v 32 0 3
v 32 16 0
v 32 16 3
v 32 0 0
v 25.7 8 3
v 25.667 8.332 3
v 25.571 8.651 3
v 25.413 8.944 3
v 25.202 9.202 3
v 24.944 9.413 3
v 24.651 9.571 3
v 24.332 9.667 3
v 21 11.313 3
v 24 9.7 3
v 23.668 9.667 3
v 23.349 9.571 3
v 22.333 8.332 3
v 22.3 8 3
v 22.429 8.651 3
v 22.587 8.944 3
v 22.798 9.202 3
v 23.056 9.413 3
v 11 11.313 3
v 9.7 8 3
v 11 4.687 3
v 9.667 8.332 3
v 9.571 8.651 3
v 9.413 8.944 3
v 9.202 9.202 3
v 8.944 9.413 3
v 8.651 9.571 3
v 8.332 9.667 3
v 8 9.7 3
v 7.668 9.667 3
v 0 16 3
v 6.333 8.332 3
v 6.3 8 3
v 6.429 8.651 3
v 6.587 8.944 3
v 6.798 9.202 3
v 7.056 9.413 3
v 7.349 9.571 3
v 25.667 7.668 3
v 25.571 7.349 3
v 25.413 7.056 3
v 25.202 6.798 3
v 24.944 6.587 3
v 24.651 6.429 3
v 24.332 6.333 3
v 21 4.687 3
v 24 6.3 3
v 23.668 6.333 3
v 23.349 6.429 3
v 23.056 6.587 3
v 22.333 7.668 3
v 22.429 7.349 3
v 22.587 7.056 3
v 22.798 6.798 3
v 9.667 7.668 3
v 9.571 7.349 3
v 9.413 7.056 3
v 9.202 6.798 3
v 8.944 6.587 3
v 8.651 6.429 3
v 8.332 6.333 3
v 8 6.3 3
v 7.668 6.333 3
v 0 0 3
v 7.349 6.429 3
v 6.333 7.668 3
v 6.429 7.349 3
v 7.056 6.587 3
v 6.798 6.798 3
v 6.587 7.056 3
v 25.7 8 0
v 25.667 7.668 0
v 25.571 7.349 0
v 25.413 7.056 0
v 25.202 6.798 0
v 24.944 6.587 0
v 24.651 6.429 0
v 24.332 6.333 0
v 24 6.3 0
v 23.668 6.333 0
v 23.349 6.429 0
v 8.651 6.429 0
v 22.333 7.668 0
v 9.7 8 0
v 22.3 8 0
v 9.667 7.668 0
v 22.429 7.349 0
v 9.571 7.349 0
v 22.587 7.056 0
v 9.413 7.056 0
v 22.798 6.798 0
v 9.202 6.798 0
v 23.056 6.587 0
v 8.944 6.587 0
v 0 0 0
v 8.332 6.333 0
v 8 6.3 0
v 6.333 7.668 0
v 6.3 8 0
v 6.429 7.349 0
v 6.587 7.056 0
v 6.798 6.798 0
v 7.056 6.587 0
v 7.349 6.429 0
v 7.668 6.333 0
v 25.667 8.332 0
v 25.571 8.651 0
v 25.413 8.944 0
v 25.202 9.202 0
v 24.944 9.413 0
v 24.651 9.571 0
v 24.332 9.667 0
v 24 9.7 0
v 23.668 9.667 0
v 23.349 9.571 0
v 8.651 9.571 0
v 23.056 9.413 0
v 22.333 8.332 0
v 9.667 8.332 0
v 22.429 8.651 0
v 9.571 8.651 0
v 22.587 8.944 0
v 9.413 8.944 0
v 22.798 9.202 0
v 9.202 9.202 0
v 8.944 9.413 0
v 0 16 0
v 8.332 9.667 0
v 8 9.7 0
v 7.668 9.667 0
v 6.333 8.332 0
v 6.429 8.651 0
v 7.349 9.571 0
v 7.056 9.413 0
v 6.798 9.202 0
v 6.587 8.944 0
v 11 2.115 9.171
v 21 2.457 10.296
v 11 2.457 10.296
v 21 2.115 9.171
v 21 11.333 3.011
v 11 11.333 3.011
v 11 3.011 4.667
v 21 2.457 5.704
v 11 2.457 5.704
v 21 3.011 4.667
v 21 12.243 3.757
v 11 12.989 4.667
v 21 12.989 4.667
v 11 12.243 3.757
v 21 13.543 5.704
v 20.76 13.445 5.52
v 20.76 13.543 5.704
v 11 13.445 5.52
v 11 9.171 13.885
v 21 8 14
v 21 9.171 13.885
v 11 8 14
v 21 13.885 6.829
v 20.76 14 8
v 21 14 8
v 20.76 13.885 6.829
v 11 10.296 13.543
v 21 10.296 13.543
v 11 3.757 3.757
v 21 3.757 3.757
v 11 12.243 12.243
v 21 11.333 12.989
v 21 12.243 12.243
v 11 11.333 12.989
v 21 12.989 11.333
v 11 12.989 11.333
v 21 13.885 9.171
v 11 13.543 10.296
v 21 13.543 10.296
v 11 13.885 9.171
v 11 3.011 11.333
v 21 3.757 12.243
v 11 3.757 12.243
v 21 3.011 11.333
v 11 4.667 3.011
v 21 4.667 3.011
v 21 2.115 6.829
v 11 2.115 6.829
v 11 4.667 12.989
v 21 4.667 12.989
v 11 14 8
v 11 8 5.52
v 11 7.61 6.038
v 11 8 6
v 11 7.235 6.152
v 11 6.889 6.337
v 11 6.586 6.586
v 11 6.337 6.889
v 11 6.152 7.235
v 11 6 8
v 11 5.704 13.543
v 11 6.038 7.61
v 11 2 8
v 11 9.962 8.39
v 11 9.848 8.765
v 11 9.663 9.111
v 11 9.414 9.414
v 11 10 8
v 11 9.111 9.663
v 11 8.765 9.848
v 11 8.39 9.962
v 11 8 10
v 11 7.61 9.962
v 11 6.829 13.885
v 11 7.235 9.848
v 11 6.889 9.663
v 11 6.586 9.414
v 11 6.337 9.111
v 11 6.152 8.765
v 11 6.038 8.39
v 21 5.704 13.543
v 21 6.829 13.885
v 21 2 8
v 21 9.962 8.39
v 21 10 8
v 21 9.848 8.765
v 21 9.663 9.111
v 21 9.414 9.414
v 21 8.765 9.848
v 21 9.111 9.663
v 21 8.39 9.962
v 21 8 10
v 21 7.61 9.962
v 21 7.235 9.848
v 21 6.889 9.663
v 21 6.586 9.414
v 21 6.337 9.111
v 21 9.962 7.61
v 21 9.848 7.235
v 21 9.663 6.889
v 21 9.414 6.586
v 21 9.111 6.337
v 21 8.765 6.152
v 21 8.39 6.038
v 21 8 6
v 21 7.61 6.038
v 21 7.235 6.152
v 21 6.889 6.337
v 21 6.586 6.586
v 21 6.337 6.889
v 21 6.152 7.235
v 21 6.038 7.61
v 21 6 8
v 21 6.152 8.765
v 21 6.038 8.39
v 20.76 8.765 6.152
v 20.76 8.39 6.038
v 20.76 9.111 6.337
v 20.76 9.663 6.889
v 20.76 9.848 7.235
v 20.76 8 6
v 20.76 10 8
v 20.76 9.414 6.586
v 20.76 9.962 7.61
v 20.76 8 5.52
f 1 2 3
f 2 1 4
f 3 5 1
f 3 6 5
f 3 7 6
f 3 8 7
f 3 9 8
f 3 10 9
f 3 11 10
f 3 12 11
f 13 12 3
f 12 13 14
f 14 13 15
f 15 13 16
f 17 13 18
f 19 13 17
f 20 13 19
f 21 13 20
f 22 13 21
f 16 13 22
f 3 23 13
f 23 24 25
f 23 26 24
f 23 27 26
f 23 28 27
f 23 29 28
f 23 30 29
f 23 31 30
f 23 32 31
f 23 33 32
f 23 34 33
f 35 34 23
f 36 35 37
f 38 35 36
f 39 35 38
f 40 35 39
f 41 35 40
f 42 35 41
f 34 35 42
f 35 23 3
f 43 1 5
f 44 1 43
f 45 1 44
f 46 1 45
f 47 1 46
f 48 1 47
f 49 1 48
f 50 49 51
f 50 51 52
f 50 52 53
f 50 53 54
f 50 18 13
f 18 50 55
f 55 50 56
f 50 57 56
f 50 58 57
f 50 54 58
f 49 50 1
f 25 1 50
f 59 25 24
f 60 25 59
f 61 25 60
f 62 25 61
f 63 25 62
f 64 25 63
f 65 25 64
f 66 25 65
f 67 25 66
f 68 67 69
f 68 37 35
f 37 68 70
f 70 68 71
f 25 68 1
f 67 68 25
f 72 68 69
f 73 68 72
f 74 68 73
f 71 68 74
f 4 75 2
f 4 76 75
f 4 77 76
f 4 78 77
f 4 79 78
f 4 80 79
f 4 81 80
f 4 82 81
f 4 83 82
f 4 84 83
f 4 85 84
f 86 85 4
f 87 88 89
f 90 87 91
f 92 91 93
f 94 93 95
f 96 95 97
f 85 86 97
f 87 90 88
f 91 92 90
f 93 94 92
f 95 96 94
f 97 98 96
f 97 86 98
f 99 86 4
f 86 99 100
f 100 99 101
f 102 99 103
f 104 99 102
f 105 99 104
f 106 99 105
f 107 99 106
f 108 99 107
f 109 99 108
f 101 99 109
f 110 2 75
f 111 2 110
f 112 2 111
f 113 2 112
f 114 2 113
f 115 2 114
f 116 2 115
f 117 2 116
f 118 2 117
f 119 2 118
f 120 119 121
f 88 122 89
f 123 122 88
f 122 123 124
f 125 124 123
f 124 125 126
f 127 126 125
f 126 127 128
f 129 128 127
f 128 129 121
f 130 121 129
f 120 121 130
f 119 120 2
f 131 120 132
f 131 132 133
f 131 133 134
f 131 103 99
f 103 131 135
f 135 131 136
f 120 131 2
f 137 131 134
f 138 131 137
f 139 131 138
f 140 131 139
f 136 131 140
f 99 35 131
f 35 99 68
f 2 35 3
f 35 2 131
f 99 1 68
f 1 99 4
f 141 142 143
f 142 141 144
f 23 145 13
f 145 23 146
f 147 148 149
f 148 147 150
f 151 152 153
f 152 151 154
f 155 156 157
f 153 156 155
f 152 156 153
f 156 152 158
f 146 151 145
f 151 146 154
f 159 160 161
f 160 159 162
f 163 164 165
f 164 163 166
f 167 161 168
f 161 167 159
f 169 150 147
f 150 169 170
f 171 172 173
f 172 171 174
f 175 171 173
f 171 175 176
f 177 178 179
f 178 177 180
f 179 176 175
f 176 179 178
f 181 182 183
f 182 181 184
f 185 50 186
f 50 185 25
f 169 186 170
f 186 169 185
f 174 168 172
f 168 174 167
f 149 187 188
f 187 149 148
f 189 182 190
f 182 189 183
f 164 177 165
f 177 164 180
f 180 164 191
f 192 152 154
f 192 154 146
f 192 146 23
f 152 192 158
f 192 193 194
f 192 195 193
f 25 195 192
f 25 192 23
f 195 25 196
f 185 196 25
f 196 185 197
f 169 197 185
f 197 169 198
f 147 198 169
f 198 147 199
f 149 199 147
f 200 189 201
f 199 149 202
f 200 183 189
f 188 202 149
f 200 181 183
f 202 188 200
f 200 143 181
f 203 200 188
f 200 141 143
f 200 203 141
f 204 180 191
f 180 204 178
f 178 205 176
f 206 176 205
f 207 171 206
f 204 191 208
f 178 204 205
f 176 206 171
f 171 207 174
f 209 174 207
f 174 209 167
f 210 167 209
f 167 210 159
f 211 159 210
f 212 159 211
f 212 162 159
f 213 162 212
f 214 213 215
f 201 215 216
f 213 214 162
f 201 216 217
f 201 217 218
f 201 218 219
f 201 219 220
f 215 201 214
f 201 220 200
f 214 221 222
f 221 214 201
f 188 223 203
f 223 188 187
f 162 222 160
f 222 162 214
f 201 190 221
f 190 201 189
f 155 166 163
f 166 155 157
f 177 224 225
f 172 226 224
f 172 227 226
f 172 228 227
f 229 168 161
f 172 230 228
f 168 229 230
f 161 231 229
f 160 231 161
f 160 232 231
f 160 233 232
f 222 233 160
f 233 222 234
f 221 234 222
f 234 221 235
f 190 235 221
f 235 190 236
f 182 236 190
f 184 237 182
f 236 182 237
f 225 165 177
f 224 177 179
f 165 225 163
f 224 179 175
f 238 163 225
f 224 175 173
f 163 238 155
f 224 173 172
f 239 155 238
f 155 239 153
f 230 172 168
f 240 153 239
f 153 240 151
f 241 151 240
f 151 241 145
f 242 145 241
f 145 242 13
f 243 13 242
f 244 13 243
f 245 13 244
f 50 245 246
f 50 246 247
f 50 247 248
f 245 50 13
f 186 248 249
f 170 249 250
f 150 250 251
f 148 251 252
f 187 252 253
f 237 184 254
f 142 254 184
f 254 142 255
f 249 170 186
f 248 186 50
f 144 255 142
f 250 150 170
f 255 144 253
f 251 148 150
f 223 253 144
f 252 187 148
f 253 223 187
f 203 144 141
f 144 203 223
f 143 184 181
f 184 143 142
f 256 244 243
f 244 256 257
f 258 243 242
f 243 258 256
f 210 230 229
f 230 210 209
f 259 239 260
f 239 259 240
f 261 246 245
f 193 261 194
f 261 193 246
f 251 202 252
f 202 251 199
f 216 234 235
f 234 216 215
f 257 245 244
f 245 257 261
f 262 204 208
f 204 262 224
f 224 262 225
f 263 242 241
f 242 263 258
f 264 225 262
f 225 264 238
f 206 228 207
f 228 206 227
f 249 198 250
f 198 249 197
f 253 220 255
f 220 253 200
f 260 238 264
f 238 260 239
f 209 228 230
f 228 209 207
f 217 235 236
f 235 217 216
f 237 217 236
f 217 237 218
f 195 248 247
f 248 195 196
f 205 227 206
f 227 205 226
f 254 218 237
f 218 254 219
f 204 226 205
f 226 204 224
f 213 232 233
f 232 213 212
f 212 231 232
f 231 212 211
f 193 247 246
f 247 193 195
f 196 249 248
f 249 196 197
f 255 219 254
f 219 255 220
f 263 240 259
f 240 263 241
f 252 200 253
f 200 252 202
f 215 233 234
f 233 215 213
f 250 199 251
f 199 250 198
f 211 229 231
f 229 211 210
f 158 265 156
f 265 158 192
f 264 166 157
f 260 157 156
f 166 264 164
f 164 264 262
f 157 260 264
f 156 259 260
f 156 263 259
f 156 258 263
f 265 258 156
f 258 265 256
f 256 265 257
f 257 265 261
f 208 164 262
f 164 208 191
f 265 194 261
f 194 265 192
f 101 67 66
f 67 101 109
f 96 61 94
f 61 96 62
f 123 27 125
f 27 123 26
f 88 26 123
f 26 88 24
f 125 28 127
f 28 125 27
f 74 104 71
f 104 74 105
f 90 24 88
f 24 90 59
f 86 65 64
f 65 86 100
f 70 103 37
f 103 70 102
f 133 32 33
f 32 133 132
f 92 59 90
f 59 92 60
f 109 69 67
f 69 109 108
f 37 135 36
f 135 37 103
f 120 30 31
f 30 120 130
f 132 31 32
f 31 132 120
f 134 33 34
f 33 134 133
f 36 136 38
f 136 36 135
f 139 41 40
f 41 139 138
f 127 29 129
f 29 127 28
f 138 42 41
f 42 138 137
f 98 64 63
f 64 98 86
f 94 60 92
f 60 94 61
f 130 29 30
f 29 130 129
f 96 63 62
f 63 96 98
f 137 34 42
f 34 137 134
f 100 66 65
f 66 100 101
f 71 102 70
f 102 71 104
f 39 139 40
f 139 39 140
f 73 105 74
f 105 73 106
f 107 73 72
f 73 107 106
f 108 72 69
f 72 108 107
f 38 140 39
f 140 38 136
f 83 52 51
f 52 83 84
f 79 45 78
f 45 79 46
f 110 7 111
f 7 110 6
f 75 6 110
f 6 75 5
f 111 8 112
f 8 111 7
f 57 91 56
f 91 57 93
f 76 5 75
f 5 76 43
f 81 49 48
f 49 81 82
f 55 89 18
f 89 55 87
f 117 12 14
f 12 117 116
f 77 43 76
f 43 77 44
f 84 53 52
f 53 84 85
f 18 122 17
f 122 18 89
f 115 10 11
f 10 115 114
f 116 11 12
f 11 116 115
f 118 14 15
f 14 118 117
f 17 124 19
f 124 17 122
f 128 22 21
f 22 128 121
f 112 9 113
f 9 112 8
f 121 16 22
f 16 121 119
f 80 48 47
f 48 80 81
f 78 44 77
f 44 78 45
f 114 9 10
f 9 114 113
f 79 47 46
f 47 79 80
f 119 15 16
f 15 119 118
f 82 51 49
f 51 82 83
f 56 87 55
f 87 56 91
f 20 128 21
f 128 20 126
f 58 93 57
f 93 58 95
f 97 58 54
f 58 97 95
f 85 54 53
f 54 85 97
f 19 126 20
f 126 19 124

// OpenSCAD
$fn = 32;

// ----------------------------------------------------------------------
// Cable clip: cable 4 mm, clamp 12 mm, base 32 mm
// ----------------------------------------------------------------------

// --- parameters (mm) ---
base_w = 32;              // base length, X
base_d = 16;              // base width, Y
base_t = 3;               // base thickness
clamp_d = 12;             // clamp outside diameter
wall_t = 4;               // clamp wall
cable_d = 4;              // cable opening
ring_w = 10;              // clamp width along the cable
screw_d = 3.4;            // screw clearance
throat = 2.48;            // snap throat width
sink = 1;                 // overlap of the clamp into the base

module base() {
  cube([base_w, base_d, base_t]);
}

module clamp() {
  translate([base_w / 2, base_d / 2, base_t + clamp_d / 2 - sink]) rotate([0, 90, 0])
    cylinder(h = ring_w, d = clamp_d, center = true);
}

difference() {
  union() {
    base();
    clamp();
  }
  translate([base_w / 2, base_d / 2, base_t + clamp_d / 2 - sink]) rotate([0, 90, 0]) translate([0, 0, -ring_w / 2 - 1]) cylinder(h = ring_w + 2, d = cable_d);
  /* snap throat: the opening is narrower than the cable */
  translate([base_w / 2 - throat / 2, base_d / 2, base_t + clamp_d / 2 - sink]) rotate([0, 90, 0]) translate([0, 0, -ring_w / 2 - 1]) cube([throat, clamp_d + 2, ring_w + 2]);
  translate([8, base_d / 2, -1]) cylinder(h = base_t + 2, d = screw_d);
  translate([24, base_d / 2, -1]) cylinder(h = base_t + 2, d = screw_d);
}
